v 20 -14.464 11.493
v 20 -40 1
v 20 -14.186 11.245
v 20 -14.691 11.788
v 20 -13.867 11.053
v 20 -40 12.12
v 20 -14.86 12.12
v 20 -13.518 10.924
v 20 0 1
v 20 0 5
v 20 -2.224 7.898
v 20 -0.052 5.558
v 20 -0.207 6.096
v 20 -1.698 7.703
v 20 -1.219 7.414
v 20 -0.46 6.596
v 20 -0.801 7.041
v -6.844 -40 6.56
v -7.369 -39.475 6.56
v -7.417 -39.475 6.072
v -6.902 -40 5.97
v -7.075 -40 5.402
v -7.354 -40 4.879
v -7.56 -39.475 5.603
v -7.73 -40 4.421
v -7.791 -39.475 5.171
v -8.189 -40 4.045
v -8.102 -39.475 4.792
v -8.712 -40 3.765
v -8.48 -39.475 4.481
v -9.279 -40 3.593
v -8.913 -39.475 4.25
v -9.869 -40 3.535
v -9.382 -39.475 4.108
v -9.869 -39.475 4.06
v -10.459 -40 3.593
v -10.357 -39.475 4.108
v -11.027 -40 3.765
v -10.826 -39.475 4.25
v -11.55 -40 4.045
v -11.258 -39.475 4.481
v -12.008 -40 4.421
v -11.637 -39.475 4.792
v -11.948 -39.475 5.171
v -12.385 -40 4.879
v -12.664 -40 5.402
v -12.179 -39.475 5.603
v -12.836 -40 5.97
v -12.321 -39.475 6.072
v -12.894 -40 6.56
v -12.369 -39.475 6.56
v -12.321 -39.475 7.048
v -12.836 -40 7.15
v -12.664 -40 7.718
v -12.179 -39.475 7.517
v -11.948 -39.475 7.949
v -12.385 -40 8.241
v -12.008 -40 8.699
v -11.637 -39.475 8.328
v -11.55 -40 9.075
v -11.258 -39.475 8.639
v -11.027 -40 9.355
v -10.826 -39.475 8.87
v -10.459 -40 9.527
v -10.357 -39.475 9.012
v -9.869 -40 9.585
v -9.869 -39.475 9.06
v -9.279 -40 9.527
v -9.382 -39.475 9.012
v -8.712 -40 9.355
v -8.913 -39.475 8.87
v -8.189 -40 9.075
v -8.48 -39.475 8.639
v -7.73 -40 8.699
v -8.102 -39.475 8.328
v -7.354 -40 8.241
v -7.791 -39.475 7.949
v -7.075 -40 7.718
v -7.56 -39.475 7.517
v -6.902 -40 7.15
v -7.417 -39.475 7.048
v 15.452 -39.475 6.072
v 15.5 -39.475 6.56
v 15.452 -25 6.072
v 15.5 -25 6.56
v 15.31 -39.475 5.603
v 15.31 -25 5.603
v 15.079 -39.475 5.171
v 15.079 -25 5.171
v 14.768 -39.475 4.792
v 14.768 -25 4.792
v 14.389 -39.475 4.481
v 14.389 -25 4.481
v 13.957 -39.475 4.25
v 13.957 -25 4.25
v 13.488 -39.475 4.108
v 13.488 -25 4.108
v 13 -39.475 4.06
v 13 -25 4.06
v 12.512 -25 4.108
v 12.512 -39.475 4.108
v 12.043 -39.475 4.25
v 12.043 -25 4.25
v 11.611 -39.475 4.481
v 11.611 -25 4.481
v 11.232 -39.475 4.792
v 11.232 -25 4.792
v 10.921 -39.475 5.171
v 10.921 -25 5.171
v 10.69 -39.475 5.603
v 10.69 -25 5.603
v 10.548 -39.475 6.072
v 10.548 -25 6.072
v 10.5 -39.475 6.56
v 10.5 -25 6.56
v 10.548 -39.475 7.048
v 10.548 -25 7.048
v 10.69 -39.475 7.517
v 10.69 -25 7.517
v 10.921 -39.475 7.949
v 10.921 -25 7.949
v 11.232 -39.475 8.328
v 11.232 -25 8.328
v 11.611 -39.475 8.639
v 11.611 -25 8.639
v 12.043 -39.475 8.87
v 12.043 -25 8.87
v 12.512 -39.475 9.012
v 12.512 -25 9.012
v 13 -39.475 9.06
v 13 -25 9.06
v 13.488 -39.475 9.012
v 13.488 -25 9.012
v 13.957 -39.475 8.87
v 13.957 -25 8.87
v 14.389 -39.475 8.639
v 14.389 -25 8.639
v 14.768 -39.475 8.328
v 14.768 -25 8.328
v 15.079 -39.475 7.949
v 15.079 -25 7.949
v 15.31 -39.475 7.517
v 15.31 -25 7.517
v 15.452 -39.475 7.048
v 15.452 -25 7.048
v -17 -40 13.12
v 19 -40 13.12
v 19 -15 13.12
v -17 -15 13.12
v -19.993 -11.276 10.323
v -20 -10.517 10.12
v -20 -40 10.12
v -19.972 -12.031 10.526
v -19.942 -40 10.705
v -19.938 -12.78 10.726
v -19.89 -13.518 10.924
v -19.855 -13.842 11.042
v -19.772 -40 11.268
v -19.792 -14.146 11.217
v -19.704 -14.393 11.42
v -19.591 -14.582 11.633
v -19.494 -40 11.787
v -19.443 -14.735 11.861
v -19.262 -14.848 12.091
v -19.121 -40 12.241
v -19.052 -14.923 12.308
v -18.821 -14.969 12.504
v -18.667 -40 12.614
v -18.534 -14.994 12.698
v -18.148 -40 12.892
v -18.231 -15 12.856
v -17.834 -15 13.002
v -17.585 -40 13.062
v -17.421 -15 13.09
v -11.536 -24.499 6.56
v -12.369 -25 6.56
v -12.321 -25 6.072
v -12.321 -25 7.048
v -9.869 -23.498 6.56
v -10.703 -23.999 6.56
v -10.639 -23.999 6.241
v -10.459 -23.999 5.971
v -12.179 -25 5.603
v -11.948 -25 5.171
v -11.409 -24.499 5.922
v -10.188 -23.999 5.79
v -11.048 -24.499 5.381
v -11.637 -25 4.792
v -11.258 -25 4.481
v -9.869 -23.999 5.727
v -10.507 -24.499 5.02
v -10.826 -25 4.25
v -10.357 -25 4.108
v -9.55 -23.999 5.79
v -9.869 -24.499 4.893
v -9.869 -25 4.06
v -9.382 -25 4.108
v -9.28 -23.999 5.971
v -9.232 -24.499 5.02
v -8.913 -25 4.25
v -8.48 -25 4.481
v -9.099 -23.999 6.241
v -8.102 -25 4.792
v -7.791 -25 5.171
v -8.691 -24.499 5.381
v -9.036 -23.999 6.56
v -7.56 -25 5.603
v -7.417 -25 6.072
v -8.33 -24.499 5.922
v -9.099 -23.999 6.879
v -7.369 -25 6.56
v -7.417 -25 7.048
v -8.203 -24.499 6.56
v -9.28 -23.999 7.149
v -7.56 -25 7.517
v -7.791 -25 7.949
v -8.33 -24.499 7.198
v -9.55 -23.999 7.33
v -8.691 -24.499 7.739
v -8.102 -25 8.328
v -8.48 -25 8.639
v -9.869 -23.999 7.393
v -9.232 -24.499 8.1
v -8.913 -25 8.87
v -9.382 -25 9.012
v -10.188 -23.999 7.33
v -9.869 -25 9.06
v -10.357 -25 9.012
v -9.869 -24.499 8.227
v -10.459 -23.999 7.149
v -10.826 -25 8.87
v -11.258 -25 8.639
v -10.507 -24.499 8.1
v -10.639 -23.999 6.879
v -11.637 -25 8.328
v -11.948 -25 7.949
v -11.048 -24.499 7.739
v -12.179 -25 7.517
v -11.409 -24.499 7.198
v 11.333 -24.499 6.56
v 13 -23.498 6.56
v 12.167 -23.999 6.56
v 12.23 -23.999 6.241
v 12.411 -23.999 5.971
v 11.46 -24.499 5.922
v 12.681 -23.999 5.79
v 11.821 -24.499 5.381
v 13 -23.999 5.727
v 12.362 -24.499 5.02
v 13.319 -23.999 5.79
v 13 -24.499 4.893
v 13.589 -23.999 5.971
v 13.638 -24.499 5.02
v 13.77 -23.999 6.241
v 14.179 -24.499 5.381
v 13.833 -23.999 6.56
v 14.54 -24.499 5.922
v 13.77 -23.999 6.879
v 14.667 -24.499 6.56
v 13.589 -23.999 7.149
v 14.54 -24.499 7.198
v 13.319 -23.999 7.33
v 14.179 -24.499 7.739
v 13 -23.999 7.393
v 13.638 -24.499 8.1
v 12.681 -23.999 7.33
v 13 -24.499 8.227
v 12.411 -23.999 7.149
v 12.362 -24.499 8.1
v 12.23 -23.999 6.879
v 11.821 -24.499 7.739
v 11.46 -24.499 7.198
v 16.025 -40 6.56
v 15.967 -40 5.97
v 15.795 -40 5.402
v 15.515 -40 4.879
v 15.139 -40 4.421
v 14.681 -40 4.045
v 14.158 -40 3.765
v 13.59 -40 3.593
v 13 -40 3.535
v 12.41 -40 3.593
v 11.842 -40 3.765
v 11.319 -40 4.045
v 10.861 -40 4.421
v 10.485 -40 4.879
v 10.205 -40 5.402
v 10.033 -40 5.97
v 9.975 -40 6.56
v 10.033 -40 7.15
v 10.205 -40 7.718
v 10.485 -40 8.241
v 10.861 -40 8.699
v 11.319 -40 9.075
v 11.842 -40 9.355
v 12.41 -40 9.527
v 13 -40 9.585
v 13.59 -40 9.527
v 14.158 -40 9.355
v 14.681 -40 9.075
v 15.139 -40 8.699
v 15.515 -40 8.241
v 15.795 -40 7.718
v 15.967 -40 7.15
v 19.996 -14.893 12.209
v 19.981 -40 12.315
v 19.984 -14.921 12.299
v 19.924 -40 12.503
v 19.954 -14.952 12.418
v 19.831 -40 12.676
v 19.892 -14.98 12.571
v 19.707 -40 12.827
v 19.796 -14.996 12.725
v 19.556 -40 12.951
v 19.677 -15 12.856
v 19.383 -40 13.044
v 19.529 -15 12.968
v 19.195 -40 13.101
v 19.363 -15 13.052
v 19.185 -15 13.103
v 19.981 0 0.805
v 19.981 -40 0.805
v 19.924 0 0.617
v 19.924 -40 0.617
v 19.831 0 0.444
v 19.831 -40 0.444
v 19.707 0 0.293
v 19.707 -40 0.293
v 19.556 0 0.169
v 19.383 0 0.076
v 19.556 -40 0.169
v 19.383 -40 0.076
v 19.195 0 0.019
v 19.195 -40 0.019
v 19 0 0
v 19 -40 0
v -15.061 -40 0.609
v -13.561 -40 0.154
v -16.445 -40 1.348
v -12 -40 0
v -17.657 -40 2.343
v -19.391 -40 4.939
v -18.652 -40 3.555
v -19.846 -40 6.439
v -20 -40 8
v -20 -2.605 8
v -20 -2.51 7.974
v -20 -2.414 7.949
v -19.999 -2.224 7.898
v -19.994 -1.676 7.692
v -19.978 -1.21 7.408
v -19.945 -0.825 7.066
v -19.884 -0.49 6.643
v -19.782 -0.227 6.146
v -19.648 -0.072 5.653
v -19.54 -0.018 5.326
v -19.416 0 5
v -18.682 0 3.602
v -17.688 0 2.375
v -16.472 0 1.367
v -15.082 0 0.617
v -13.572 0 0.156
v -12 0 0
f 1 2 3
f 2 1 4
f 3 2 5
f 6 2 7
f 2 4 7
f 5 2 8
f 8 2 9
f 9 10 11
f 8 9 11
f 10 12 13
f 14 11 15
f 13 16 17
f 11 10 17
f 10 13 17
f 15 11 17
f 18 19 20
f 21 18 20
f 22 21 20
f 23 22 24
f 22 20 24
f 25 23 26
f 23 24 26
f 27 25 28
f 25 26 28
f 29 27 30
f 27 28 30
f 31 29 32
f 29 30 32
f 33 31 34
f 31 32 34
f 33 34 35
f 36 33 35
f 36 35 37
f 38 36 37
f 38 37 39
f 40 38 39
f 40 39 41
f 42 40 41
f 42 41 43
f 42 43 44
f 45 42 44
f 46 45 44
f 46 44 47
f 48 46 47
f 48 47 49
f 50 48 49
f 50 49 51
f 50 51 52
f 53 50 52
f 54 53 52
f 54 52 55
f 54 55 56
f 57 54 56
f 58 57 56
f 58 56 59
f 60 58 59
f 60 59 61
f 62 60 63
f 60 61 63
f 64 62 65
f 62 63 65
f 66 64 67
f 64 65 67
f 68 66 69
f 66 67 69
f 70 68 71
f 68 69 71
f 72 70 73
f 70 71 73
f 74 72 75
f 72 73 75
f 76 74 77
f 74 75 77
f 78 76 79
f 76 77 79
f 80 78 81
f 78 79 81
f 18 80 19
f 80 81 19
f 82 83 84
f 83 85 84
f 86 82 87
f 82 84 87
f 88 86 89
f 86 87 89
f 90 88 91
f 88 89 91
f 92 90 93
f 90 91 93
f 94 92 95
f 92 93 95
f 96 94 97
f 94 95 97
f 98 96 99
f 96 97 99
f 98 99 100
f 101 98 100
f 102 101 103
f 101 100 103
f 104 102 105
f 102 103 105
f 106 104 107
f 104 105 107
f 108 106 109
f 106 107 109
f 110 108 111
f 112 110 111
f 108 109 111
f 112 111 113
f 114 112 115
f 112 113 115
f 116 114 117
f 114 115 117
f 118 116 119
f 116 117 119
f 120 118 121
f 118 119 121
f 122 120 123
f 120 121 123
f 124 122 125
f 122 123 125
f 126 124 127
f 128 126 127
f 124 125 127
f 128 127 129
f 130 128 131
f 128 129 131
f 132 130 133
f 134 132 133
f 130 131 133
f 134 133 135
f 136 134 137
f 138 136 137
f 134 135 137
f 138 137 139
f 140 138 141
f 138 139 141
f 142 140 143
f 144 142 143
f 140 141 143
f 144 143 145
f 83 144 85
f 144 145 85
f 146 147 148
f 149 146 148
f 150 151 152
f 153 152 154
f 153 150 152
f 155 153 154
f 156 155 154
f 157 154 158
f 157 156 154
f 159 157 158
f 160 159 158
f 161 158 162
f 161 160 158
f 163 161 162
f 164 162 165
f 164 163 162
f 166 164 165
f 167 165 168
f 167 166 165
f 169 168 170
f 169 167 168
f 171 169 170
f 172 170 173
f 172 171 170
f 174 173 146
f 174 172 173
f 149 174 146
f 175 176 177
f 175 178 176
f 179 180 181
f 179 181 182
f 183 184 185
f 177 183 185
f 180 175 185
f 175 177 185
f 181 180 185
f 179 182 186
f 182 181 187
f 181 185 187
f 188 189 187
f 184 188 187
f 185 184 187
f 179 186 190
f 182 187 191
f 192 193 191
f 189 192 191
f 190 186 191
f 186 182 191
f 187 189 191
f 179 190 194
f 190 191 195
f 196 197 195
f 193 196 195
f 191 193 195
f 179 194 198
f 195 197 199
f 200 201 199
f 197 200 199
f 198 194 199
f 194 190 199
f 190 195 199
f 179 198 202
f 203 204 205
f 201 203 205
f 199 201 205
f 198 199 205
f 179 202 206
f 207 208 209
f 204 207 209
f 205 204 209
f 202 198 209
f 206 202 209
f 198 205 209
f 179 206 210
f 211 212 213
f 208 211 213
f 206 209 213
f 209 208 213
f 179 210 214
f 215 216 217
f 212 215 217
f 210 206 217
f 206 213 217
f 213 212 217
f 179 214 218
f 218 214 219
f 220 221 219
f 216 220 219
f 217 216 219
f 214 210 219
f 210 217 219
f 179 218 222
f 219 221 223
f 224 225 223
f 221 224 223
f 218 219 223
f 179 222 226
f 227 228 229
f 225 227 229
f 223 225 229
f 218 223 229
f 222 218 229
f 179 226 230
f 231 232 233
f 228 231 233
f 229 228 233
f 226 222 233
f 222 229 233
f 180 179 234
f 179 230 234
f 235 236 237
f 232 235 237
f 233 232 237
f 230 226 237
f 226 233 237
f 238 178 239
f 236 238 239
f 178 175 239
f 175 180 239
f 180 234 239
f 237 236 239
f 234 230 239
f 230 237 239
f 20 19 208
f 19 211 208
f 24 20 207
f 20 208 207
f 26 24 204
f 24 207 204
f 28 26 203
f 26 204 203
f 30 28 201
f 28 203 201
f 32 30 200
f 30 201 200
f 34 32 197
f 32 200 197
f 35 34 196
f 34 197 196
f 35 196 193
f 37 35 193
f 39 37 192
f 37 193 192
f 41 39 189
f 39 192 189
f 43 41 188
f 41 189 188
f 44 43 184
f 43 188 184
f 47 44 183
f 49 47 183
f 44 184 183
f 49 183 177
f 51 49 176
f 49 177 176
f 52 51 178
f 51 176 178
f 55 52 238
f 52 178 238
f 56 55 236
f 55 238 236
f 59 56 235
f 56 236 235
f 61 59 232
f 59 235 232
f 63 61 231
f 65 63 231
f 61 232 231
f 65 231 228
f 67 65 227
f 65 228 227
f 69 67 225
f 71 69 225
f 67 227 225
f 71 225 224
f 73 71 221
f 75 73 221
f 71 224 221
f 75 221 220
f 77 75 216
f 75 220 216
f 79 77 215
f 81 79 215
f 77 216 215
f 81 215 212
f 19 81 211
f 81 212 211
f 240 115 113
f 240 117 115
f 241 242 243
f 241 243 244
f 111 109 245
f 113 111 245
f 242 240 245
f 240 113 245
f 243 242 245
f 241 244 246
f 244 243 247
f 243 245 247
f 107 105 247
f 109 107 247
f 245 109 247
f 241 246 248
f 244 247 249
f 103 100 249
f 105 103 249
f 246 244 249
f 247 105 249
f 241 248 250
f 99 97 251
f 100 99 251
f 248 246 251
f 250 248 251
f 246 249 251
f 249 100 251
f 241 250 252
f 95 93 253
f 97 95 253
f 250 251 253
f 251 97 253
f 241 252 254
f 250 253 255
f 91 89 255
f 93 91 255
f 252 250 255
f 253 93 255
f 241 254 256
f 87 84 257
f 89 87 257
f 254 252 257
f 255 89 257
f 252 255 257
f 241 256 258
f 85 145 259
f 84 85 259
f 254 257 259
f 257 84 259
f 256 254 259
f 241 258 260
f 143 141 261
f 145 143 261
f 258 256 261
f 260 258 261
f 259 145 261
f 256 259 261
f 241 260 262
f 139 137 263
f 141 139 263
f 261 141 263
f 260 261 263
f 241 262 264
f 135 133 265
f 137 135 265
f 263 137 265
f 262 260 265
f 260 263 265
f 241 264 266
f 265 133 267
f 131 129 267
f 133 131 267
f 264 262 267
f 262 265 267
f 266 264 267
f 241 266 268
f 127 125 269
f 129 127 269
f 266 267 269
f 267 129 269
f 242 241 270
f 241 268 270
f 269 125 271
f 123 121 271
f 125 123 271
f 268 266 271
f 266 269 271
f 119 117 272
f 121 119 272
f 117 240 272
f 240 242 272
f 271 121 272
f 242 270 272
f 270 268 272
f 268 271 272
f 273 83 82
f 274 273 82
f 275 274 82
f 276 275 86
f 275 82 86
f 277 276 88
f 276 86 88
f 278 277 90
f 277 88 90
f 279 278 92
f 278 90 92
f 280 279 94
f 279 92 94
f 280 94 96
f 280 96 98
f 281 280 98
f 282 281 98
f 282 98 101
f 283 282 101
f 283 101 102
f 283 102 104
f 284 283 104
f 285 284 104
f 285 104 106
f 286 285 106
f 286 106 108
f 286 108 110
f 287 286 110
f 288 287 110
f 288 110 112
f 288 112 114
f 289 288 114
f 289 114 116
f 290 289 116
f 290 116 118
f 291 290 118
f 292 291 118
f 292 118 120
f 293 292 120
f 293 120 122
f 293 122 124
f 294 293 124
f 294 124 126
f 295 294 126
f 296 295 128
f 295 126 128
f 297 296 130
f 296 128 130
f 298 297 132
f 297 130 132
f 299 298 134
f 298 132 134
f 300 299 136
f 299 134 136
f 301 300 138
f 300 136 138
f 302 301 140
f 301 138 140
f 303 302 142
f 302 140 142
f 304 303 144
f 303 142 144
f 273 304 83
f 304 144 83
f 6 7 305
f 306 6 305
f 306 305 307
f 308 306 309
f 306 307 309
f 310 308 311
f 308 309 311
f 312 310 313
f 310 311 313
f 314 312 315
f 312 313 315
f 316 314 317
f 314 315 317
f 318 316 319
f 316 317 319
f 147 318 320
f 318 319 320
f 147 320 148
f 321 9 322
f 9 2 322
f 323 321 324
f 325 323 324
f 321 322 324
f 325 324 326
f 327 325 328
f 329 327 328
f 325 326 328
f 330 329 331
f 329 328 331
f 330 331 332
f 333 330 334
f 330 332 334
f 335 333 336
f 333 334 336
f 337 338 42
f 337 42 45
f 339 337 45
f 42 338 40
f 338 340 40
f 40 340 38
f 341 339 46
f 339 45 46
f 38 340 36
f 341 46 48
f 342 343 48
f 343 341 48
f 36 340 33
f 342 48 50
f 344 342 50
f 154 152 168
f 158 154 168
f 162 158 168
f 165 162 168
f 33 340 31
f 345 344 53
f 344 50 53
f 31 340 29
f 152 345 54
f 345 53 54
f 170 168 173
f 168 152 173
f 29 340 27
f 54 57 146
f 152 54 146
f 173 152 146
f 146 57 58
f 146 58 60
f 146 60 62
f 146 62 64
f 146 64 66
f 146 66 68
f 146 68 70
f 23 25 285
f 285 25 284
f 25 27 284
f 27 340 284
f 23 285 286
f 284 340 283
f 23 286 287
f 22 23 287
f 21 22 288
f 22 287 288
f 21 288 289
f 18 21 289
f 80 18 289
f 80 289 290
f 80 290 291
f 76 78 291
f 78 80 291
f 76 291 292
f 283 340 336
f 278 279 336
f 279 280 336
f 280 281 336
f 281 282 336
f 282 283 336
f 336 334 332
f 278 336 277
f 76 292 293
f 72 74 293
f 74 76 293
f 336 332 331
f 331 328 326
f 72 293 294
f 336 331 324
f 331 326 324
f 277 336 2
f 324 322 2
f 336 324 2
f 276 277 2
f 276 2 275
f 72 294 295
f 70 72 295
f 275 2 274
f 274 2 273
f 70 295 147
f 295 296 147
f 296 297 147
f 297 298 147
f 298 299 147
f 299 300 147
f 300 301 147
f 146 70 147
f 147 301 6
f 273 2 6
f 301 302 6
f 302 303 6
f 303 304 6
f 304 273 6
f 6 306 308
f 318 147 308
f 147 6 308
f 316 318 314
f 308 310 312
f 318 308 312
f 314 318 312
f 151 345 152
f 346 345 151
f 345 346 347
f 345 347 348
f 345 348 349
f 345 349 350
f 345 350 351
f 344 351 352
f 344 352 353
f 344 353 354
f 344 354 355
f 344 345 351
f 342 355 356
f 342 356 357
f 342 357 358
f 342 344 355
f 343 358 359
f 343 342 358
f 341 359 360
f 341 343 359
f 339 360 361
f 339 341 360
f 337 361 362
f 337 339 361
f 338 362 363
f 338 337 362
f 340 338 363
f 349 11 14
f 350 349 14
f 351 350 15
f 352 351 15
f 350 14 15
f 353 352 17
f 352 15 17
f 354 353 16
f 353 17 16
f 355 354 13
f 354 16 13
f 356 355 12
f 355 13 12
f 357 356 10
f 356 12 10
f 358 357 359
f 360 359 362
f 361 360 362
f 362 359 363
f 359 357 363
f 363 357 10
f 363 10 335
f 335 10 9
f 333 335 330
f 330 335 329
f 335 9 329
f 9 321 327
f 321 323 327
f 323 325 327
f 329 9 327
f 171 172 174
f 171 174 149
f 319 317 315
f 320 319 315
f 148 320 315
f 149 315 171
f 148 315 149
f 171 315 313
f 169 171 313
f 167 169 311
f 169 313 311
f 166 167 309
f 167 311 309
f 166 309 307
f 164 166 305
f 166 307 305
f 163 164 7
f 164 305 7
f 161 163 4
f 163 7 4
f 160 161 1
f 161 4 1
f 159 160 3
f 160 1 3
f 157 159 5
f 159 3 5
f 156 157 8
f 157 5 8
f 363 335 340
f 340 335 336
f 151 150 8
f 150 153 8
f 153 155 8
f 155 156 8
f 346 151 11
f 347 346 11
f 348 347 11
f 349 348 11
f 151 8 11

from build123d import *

# Parameters (mm, degrees)
BOSS_EXTRUDE1_DEPTH         = 20
FILLET1_R                   = 1
FILLET2_R                   = 2
FILLET3_R                   = 8
FILLET4_R                   = 3
M6_TAPPED_HOLE1_D           = 5
M6_TAPPED_HOLE1_DEPTH       = 15
M6_TAPPED_HOLE1_CSINK_D     = 6.05
M6_TAPPED_HOLE1_CSINK_ANGLE = 90
M6_TAPPED_HOLE1_TIP         = 1.502151548


with BuildPart() as part:
    # Sketch1 → Boss-Extrude1 (new, symmetric)
    with BuildSketch(Plane(origin=(0, 0, 0), x_dir=(0, 0, -1), z_dir=(1, 0, 0))):
        with BuildLine():
            Line((-5, 0), (0, 0))
            Line((0, 0), (0, -40))
            Line((0, -40), (-13.12, -40))
            Line((-13.12, -40), (-13.12, -15))
            Line((-13.12, -15), (-11.32121885, -15))
            Line((-11.32121885, -15), (-7.897777479, -2.223542865))
            ThreePointArc((-7.897777479, -2.223542865), (-6.826284287, -0.619939979), (-5, 0))
        make_face()
    extrude(amount=BOSS_EXTRUDE1_DEPTH, both=True)

    # Fillet1
    fillet1_edges = [part.edges().sort_by_distance(p)[0] for p in [
        (20, -27.5, 13.12),
        (20, -20, 0),
    ]]
    fillet(fillet1_edges, radius=FILLET1_R)

    # Fillet2
    fillet2_edges = [part.edges().sort_by_distance(p)[0] for p in [
        (0, -15, 11.32121885),
    ]]
    fillet(fillet2_edges, radius=FILLET2_R)

    # Fillet3
    fillet3_edges = [part.edges().sort_by_distance(p)[0] for p in [
        (-20, -20, 0),
    ]]
    fillet(fillet3_edges, radius=FILLET3_R)

    # Fillet4
    fillet4_edges = [part.edges().sort_by_distance(p)[0] for p in [
        (-20, -27.5, 13.12),
    ]]
    fillet(fillet4_edges, radius=FILLET4_R)

    # M6 Tapped Hole1
    with Locations(Plane(origin=(0, -40, 0), x_dir=(-1, 0, 0), z_dir=(0, -1, 0))):
        with Locations((-13, -6.56), (9.869332882, -6.56)):
            CounterSinkHole(M6_TAPPED_HOLE1_D / 2, M6_TAPPED_HOLE1_CSINK_D / 2, depth=M6_TAPPED_HOLE1_DEPTH, counter_sink_angle=M6_TAPPED_HOLE1_CSINK_ANGLE)
            with Locations((0, 0, -(M6_TAPPED_HOLE1_DEPTH + M6_TAPPED_HOLE1_TIP / 2))):  # 118° drill point
                Cone(0, M6_TAPPED_HOLE1_D / 2, M6_TAPPED_HOLE1_TIP, mode=Mode.SUBTRACT)


solid = part.part
